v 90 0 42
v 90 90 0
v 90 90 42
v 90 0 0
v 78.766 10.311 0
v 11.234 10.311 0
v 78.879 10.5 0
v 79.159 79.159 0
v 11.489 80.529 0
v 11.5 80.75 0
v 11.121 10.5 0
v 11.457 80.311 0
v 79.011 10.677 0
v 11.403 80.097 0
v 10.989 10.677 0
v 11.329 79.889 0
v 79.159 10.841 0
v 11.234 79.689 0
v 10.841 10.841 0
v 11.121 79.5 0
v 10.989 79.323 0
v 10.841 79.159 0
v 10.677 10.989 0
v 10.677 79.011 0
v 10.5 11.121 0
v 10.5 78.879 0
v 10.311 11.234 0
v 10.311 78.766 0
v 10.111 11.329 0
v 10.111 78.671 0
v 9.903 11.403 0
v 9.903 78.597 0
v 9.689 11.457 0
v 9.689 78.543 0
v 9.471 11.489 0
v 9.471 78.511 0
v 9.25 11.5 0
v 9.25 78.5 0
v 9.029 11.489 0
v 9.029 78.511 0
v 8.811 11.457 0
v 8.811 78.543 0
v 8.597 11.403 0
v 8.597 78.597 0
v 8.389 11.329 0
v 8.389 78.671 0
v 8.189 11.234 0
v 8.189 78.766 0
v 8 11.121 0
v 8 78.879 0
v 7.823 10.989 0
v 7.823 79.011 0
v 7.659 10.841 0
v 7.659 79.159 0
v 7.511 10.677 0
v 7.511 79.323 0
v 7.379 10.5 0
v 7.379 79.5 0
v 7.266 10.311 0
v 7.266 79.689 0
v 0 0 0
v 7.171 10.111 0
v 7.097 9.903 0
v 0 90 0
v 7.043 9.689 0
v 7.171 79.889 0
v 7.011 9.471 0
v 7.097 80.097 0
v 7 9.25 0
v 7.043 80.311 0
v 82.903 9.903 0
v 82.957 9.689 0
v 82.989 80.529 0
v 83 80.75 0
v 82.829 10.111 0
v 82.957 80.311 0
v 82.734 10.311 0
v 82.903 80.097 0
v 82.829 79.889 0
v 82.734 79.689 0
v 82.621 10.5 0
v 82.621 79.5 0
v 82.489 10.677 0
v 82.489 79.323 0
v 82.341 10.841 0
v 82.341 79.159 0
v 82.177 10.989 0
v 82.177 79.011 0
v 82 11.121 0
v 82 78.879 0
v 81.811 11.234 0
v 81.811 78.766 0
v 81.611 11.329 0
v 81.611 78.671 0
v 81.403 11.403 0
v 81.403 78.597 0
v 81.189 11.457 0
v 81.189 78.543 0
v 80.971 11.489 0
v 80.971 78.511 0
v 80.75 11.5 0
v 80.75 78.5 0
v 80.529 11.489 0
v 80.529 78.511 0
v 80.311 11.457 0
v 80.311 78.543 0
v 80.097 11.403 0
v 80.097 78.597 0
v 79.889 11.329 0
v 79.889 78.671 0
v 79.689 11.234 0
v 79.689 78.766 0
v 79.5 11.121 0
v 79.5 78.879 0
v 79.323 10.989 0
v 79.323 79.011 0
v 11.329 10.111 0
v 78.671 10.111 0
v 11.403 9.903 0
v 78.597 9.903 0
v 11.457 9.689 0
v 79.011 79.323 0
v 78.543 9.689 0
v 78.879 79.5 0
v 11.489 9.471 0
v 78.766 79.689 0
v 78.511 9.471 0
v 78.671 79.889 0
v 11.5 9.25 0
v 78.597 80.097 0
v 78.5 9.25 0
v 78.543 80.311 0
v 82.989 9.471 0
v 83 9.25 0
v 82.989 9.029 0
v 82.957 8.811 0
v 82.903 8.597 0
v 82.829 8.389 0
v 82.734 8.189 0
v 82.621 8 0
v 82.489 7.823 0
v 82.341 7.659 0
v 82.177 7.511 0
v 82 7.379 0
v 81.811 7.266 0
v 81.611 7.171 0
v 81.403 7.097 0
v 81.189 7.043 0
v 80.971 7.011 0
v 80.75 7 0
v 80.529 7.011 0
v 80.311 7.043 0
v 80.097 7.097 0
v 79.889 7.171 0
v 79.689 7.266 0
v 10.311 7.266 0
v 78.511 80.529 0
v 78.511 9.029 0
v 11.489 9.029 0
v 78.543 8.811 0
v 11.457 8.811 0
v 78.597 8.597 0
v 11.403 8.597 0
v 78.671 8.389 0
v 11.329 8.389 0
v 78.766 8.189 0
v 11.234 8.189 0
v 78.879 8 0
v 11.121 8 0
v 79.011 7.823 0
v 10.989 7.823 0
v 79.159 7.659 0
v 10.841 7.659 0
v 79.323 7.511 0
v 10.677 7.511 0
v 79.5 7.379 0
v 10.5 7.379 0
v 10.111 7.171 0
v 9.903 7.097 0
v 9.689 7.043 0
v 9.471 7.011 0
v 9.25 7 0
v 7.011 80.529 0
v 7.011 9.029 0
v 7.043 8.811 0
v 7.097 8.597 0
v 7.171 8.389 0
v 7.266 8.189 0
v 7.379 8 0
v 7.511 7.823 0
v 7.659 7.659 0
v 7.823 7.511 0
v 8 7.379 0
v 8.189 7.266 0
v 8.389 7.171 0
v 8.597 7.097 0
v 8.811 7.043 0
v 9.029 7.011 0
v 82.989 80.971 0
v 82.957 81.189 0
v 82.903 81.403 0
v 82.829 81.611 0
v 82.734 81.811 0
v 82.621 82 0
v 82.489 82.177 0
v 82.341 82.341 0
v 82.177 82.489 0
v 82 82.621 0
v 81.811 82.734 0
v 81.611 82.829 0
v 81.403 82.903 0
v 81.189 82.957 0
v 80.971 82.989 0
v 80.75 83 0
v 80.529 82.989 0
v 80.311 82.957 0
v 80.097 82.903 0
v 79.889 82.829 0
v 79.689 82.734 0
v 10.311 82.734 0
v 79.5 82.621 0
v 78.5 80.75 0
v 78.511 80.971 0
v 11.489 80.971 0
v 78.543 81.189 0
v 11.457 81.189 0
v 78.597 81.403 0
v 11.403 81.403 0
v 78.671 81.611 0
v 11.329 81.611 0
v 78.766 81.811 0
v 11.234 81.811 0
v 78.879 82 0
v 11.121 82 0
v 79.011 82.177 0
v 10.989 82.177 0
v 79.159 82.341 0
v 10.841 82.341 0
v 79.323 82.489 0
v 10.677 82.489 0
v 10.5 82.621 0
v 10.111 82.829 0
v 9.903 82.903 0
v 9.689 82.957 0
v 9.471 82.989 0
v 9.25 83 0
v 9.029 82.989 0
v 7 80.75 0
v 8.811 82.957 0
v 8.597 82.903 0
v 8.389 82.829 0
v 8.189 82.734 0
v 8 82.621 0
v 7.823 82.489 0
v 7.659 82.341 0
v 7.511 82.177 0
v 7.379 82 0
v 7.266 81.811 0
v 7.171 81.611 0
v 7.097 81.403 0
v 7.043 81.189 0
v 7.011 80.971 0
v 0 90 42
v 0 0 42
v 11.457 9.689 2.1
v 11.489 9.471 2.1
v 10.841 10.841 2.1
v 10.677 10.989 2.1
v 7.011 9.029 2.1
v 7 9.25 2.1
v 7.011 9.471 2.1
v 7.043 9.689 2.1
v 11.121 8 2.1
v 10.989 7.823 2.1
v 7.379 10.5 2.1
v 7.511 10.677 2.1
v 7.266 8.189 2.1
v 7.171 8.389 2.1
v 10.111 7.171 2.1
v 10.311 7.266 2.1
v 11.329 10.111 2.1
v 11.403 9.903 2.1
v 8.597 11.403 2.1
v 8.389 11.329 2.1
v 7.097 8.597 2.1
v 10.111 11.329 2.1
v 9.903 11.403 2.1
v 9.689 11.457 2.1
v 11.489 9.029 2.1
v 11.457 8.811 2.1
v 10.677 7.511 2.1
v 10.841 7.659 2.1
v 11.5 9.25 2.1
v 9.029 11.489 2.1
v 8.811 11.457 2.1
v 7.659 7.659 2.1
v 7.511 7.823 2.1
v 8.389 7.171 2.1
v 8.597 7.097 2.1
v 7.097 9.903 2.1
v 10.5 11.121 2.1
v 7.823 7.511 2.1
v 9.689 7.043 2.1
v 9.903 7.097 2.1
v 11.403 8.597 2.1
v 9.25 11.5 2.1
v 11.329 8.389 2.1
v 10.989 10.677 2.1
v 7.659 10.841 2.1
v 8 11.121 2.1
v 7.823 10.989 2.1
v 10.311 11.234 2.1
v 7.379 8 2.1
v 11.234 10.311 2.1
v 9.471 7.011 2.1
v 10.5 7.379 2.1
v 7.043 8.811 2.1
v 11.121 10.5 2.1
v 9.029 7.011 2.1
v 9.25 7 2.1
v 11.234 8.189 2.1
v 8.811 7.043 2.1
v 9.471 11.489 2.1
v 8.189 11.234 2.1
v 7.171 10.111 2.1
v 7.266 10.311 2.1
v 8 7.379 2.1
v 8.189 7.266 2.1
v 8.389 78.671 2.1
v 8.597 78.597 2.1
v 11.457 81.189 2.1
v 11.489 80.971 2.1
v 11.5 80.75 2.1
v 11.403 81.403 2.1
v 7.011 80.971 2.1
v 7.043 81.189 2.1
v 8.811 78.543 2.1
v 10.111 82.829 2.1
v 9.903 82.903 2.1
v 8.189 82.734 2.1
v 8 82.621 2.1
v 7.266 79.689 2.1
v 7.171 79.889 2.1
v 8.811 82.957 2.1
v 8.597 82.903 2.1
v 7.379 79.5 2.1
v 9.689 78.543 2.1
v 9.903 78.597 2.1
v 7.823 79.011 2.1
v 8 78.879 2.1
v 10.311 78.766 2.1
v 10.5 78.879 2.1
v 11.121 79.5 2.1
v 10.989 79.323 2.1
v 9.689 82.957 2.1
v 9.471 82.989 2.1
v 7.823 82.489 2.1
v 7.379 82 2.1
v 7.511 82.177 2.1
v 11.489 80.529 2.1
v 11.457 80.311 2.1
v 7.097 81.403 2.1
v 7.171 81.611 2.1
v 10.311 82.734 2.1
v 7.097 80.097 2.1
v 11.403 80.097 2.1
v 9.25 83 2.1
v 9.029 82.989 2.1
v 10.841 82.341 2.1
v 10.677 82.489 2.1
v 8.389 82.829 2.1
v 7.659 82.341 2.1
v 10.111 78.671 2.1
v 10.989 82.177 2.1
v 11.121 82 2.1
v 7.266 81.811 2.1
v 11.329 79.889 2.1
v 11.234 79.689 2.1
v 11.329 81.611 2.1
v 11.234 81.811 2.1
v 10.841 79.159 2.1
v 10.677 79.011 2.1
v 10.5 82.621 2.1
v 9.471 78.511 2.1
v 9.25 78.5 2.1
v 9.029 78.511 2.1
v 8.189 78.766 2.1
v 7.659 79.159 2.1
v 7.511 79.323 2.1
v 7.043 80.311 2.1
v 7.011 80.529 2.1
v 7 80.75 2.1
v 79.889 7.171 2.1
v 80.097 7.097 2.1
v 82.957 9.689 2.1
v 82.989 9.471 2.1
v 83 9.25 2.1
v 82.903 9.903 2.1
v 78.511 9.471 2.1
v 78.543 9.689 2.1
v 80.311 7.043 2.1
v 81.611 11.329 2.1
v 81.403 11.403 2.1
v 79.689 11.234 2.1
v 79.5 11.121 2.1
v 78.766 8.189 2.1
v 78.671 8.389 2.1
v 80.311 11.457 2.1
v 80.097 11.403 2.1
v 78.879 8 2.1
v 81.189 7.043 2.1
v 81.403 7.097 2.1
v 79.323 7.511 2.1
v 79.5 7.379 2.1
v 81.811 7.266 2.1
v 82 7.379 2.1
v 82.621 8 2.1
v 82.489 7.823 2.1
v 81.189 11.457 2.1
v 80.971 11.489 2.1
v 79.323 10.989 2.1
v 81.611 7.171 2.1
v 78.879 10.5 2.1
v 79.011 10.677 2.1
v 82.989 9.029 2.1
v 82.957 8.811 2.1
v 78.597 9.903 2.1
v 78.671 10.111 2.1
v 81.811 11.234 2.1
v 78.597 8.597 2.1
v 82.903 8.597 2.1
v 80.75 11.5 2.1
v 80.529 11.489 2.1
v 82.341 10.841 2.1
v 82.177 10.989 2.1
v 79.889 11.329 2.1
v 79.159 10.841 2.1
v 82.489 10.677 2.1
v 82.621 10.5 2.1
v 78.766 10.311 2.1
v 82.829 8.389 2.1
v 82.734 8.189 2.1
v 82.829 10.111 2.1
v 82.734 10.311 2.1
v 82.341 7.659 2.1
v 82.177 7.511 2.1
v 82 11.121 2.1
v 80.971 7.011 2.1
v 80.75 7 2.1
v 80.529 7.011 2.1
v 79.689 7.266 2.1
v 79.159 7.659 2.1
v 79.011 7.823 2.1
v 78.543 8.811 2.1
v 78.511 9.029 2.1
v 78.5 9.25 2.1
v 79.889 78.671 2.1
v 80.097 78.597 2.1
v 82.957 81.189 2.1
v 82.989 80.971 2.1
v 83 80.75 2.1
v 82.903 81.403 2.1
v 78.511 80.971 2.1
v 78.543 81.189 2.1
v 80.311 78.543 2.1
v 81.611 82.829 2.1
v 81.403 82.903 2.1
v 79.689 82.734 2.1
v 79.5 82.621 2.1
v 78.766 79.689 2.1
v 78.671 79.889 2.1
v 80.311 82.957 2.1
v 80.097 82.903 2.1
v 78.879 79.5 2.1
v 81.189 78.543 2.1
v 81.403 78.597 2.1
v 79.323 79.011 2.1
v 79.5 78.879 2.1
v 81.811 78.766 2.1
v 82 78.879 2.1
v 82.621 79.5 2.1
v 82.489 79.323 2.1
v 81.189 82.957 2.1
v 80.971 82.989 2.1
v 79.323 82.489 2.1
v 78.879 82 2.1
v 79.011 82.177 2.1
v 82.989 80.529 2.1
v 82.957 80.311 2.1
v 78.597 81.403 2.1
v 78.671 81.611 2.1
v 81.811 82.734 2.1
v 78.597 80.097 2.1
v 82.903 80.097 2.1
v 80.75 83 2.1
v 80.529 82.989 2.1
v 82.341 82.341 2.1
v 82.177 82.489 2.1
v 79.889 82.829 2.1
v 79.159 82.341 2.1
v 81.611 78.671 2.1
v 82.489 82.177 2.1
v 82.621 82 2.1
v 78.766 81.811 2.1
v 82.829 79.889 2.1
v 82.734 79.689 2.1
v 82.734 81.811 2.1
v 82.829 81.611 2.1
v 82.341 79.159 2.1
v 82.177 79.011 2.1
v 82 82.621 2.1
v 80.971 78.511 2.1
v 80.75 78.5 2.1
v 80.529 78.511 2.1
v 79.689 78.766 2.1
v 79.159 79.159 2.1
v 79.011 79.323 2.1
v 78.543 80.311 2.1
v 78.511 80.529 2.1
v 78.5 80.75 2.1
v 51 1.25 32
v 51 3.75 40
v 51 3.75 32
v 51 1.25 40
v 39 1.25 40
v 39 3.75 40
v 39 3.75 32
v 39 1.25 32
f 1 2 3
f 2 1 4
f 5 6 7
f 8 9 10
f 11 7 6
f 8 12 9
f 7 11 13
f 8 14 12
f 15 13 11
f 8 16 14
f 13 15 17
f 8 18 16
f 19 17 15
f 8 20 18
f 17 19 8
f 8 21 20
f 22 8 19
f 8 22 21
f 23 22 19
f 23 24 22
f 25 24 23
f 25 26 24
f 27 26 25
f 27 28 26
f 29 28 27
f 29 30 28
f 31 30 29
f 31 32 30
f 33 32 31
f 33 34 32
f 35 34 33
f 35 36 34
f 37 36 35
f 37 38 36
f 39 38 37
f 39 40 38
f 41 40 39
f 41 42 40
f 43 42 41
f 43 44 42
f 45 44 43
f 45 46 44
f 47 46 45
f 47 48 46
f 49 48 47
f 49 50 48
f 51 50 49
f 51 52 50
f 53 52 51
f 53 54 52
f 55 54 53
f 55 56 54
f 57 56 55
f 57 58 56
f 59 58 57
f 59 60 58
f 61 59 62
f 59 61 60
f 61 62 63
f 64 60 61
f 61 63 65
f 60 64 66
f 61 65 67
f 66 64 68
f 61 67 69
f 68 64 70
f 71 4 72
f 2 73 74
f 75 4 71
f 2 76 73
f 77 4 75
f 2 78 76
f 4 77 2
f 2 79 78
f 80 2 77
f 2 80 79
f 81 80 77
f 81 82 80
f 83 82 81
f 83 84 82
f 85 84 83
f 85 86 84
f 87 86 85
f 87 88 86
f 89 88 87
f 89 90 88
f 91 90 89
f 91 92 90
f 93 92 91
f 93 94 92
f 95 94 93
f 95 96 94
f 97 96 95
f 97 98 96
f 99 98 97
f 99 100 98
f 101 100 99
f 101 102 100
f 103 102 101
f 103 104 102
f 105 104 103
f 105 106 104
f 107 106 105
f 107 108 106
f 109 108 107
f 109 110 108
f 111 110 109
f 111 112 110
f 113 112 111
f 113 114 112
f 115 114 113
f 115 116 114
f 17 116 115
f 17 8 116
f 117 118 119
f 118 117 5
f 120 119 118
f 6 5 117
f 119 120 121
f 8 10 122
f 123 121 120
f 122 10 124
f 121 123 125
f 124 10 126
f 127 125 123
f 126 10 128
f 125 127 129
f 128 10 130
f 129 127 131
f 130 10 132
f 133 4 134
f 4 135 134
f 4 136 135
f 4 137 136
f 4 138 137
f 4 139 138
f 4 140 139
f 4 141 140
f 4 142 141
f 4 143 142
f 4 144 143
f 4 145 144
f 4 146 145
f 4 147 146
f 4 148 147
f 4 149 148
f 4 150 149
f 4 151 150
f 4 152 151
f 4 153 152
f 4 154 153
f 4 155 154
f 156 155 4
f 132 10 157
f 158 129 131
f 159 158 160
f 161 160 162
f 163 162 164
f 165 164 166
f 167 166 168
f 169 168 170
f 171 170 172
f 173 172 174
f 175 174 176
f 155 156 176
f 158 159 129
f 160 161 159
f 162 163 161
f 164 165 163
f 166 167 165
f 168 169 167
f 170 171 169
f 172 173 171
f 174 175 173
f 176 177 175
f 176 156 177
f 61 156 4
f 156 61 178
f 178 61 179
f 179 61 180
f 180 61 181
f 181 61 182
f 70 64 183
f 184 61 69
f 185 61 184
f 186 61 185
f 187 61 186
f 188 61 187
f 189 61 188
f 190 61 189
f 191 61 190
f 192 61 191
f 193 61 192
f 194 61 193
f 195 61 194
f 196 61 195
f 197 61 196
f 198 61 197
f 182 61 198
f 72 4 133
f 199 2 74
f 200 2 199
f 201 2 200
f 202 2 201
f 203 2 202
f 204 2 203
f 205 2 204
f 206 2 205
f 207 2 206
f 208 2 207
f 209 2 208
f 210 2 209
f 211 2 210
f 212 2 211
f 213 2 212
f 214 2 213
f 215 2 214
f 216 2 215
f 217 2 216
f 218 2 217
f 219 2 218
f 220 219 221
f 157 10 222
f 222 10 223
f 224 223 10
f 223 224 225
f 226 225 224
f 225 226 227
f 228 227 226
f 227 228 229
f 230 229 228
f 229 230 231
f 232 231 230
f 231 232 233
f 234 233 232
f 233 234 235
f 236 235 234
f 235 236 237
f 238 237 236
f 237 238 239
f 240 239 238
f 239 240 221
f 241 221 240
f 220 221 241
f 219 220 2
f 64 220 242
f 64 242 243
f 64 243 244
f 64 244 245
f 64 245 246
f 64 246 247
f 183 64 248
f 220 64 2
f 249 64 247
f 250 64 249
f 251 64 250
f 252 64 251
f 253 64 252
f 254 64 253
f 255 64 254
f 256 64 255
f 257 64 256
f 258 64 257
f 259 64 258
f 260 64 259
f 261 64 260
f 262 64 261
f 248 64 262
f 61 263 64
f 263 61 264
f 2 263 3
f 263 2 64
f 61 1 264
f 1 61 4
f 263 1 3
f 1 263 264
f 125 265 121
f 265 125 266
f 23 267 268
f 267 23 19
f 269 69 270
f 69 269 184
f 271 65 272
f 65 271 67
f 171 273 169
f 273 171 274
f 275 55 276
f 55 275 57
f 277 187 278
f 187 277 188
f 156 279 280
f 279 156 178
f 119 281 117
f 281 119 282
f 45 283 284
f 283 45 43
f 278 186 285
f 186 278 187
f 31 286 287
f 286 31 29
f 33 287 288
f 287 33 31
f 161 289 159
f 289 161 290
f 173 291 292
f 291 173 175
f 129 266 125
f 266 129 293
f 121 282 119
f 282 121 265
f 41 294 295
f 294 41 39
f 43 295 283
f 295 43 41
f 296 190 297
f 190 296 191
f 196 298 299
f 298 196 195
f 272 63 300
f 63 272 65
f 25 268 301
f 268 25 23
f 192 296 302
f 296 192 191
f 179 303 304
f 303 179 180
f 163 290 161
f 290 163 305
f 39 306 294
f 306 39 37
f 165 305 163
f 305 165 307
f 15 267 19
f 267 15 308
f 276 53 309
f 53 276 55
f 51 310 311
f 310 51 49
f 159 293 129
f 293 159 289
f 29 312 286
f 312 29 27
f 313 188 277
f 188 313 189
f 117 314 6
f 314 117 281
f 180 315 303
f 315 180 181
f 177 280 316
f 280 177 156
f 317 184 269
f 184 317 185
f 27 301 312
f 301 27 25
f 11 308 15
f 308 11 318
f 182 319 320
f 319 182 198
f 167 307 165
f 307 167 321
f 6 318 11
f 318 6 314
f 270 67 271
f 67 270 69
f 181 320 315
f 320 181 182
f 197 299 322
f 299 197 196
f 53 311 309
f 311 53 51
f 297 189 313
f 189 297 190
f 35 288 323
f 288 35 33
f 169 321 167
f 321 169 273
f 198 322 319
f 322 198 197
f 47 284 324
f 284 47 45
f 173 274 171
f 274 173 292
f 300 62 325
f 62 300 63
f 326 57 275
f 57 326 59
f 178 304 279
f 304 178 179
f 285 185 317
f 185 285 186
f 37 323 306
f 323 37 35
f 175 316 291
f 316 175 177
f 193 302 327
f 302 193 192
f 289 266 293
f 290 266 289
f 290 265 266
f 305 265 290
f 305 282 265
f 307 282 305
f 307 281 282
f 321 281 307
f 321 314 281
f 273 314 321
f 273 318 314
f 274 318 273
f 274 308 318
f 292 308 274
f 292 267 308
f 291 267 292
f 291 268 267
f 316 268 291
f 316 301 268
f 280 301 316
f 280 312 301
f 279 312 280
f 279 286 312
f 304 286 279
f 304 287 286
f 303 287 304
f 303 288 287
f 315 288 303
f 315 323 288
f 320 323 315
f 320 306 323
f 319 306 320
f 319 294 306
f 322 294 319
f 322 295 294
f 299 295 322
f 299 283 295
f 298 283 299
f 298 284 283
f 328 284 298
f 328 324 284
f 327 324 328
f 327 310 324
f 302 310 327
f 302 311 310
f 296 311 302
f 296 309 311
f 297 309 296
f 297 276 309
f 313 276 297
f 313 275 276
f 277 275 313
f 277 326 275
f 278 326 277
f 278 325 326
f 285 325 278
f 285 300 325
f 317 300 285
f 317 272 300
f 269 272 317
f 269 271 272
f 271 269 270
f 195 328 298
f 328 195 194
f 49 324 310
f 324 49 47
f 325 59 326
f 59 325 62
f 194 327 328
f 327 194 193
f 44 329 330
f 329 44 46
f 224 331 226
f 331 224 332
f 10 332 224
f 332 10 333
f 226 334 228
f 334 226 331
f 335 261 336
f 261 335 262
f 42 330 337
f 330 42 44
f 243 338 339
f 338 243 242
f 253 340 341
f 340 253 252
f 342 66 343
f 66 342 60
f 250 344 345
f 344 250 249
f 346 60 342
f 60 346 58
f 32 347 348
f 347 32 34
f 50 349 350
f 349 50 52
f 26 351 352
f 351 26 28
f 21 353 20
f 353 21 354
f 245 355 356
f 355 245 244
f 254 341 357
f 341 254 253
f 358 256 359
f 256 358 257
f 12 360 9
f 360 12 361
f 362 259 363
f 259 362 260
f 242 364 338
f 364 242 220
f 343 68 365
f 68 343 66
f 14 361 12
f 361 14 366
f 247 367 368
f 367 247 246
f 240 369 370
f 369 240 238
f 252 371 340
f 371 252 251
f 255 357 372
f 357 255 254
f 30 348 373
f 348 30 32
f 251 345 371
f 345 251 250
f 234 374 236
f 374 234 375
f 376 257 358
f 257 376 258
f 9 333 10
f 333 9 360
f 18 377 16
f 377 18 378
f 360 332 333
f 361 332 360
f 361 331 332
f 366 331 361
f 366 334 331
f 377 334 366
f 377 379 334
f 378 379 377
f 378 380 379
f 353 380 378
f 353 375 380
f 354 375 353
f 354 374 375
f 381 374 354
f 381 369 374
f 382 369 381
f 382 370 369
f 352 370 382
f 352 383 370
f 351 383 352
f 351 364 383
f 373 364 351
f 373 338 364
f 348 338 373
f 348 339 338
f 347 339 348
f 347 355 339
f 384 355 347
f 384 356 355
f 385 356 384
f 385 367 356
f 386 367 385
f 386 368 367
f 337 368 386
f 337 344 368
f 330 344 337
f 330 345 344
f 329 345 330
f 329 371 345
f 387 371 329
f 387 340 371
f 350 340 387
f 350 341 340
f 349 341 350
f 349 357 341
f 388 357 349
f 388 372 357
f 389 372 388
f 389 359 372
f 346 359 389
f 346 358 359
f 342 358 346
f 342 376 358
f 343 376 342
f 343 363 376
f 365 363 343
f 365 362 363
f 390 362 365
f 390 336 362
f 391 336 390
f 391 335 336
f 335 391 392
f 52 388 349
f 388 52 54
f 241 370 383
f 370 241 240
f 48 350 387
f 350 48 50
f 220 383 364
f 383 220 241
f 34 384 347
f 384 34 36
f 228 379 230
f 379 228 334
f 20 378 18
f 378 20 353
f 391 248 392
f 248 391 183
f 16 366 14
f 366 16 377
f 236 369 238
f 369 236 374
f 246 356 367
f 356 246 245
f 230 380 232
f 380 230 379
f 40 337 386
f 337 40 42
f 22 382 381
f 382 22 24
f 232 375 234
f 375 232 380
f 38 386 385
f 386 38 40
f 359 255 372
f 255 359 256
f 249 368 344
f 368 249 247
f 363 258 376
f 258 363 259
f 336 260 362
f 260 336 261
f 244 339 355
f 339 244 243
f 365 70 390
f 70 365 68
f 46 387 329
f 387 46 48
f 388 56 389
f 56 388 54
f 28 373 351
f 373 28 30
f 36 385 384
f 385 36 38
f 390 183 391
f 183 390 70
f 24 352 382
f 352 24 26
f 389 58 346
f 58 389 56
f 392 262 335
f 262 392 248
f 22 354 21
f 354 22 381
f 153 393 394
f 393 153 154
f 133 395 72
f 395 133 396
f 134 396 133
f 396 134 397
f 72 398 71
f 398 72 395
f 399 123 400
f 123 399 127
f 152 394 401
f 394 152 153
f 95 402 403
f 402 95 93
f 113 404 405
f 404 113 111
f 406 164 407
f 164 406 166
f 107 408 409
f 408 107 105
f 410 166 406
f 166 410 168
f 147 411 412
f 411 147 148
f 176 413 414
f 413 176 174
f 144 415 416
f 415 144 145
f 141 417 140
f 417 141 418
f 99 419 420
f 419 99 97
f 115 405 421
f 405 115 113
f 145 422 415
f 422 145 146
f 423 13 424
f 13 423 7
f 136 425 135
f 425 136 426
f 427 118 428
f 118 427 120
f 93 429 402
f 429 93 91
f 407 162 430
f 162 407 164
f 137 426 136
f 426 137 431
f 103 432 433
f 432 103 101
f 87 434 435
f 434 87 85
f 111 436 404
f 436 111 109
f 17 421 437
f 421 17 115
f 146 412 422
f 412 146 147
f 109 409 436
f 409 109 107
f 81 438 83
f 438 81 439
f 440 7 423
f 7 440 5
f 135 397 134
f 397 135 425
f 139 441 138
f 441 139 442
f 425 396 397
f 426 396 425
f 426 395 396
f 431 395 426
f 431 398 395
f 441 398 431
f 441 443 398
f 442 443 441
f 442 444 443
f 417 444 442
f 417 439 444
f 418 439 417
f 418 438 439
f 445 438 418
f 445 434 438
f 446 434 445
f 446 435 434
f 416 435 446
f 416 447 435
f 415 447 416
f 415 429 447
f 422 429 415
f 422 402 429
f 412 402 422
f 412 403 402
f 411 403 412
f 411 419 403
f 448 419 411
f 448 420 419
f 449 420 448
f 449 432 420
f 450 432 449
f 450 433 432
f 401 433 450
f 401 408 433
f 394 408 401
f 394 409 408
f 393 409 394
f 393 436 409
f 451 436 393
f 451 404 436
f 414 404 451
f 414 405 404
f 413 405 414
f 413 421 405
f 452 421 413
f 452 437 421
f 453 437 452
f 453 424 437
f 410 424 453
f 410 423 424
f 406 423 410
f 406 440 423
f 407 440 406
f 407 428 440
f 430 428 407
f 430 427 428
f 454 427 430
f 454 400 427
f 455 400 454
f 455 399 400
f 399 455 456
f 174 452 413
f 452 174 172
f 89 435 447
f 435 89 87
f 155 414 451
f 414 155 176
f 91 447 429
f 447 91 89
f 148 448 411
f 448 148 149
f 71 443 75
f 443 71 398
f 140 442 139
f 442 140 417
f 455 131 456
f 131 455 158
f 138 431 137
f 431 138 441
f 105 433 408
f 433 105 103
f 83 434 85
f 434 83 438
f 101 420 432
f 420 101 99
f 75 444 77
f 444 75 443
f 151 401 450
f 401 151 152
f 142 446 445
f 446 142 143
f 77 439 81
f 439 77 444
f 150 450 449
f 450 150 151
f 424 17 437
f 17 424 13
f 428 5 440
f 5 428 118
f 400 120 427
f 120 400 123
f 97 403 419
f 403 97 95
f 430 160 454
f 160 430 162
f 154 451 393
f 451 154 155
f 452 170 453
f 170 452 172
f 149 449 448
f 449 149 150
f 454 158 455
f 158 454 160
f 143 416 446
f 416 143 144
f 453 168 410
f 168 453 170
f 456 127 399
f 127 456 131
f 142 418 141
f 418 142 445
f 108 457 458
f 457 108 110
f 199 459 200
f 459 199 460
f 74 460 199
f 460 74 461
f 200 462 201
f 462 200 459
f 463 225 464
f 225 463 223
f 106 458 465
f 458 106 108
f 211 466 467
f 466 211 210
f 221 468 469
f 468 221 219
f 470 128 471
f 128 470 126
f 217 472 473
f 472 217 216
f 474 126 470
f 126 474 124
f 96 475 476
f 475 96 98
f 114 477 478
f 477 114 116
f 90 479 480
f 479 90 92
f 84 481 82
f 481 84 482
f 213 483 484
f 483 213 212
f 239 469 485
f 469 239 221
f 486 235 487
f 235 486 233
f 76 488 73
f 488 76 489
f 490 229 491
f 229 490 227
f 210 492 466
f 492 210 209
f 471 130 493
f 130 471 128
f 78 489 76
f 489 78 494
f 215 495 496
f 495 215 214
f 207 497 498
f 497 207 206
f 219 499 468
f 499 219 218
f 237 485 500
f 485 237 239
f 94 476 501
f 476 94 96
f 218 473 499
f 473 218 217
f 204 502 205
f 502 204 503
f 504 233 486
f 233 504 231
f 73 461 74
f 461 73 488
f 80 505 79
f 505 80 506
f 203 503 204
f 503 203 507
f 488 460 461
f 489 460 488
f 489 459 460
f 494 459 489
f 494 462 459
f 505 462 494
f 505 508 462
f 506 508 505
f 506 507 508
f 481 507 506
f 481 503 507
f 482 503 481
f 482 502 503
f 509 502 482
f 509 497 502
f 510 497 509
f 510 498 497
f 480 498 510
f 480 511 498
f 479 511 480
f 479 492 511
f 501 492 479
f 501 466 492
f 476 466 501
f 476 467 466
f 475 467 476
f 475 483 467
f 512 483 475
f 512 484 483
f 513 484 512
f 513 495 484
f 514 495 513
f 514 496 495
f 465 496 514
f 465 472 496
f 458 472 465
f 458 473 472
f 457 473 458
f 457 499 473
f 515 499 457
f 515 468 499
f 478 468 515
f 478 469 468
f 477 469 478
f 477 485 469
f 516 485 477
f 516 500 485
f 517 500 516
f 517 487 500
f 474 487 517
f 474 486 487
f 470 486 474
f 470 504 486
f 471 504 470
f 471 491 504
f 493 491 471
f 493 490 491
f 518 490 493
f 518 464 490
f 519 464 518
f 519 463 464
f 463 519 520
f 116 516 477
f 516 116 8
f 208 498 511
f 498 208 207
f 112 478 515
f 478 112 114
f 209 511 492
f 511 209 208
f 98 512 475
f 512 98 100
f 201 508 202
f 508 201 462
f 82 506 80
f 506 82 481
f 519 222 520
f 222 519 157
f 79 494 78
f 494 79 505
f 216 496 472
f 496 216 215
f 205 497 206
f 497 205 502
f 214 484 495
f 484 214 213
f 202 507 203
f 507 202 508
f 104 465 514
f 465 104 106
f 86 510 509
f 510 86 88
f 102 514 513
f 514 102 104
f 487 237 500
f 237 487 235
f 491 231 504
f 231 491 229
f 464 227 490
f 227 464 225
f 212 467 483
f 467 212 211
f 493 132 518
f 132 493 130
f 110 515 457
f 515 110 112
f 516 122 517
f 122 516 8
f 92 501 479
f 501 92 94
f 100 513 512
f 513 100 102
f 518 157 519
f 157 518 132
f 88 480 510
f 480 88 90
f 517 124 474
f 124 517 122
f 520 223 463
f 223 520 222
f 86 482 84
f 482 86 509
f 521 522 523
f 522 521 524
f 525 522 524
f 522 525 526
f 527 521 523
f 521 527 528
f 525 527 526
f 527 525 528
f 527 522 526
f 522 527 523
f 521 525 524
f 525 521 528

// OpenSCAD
// DIY Magnetic Stirrer Housing
// Based on an 80mm PC case fan
// Print orientation: Upside down (Top plate on bed, walls rising up)

// --- Dimensions ---
// Outer dimensions of the box
W = 90;      // Width (X)
D = 90;      // Depth (Y)
H_WALL = 40; // Height of walls (Z) - Must be exactly 40

// Wall thickness
T_WALL = 2.5;

// Top plate thickness
T_TOP = 2;

// Fan mounting hole pattern
PATTERN_SIZE = 71.5; // Distance between opposite holes
HOLE_SIZE = 4.5;      // Diameter of M4 screw holes - Must be exactly 4.5

// Cable notch dimensions
NOTCH_WIDTH = 12;
NOTCH_DEPTH = 8;      // Depth from the open top edge (Z = H_WALL)

// --- Configuration ---
$fn = 64; // Smooth curves

// --- Main Body Construction ---
// We build the solid from the bottom up.
// The base is the top plate (z=0 to z=2).
// The walls rise from z=2 to z=40.

difference() {
    union() {
        // 1. The Top Plate (Base)
        // Outer size W x D, thickness T_TOP
        translate([0, 0, 0]) 
            cube([W, D, T_TOP]);

        // 2. The Walls
        // Rise from z = T_TOP to z = H_WALL
        // Outer dimensions W x D
        translate([0, 0, T_TOP]) 
            cube([W, D, H_WALL]);
    }

    // --- Cutouts ---

    // 1. Screw Holes in the Top Plate
    // Pattern: 71.5mm square centered on the plate.
    // Plate is 90x90. Center is (45, 45).
    // Pattern center is (45, 45).
    // Hole positions: +/- 35.75 from center.
    // Coordinates: 9.25, 80.75
    
    for (i = [-1, 1]) {
        for (j = [-1, 1]) {
            // Calculate position
            px = 45 + (PATTERN_SIZE / 2) * i;
            py = 45 + (PATTERN_SIZE / 2) * j;
            
            // Cut hole through the top plate only (z=0 to z=2)
            // To ensure a clean cut, the cylinder extends slightly past the plate thickness
            // but the diameter is exactly HOLE_SIZE.
            translate([px, py, 0]) 
                cylinder(h = T_TOP + 0.1, r = HOLE_SIZE / 2);
        }
    }

    // 2. Cable Notch in One Wall
    // Location: One of the walls. Let's choose the front wall (Y = 0).
    // The wall is at Y = 0 (face) to Y = 2.5 (inner face).
    // The notch is 12mm wide, centered along the wall (X=45).
    // Notch X range: 45 - 6 = 39 to 45 + 6 = 51.
    // Notch Z range: From open edge (Z=40) down 8mm -> Z=32 to Z=40.
    // Notch Y range: Through the wall thickness (2.5mm). Centered at Y=1.25.
    
    // We cut a block that removes the material from Z=32 to Z=40
    // The block dimensions: [NOTCH_WIDTH, T_WALL, NOTCH_DEPTH]
    // Position: X=39, Y=1.25, Z=32
    
    translate([45 - NOTCH_WIDTH/2, T_WALL/2, H_WALL - NOTCH_DEPTH]) 
        cube([NOTCH_WIDTH, T_WALL, NOTCH_DEPTH]);
}
